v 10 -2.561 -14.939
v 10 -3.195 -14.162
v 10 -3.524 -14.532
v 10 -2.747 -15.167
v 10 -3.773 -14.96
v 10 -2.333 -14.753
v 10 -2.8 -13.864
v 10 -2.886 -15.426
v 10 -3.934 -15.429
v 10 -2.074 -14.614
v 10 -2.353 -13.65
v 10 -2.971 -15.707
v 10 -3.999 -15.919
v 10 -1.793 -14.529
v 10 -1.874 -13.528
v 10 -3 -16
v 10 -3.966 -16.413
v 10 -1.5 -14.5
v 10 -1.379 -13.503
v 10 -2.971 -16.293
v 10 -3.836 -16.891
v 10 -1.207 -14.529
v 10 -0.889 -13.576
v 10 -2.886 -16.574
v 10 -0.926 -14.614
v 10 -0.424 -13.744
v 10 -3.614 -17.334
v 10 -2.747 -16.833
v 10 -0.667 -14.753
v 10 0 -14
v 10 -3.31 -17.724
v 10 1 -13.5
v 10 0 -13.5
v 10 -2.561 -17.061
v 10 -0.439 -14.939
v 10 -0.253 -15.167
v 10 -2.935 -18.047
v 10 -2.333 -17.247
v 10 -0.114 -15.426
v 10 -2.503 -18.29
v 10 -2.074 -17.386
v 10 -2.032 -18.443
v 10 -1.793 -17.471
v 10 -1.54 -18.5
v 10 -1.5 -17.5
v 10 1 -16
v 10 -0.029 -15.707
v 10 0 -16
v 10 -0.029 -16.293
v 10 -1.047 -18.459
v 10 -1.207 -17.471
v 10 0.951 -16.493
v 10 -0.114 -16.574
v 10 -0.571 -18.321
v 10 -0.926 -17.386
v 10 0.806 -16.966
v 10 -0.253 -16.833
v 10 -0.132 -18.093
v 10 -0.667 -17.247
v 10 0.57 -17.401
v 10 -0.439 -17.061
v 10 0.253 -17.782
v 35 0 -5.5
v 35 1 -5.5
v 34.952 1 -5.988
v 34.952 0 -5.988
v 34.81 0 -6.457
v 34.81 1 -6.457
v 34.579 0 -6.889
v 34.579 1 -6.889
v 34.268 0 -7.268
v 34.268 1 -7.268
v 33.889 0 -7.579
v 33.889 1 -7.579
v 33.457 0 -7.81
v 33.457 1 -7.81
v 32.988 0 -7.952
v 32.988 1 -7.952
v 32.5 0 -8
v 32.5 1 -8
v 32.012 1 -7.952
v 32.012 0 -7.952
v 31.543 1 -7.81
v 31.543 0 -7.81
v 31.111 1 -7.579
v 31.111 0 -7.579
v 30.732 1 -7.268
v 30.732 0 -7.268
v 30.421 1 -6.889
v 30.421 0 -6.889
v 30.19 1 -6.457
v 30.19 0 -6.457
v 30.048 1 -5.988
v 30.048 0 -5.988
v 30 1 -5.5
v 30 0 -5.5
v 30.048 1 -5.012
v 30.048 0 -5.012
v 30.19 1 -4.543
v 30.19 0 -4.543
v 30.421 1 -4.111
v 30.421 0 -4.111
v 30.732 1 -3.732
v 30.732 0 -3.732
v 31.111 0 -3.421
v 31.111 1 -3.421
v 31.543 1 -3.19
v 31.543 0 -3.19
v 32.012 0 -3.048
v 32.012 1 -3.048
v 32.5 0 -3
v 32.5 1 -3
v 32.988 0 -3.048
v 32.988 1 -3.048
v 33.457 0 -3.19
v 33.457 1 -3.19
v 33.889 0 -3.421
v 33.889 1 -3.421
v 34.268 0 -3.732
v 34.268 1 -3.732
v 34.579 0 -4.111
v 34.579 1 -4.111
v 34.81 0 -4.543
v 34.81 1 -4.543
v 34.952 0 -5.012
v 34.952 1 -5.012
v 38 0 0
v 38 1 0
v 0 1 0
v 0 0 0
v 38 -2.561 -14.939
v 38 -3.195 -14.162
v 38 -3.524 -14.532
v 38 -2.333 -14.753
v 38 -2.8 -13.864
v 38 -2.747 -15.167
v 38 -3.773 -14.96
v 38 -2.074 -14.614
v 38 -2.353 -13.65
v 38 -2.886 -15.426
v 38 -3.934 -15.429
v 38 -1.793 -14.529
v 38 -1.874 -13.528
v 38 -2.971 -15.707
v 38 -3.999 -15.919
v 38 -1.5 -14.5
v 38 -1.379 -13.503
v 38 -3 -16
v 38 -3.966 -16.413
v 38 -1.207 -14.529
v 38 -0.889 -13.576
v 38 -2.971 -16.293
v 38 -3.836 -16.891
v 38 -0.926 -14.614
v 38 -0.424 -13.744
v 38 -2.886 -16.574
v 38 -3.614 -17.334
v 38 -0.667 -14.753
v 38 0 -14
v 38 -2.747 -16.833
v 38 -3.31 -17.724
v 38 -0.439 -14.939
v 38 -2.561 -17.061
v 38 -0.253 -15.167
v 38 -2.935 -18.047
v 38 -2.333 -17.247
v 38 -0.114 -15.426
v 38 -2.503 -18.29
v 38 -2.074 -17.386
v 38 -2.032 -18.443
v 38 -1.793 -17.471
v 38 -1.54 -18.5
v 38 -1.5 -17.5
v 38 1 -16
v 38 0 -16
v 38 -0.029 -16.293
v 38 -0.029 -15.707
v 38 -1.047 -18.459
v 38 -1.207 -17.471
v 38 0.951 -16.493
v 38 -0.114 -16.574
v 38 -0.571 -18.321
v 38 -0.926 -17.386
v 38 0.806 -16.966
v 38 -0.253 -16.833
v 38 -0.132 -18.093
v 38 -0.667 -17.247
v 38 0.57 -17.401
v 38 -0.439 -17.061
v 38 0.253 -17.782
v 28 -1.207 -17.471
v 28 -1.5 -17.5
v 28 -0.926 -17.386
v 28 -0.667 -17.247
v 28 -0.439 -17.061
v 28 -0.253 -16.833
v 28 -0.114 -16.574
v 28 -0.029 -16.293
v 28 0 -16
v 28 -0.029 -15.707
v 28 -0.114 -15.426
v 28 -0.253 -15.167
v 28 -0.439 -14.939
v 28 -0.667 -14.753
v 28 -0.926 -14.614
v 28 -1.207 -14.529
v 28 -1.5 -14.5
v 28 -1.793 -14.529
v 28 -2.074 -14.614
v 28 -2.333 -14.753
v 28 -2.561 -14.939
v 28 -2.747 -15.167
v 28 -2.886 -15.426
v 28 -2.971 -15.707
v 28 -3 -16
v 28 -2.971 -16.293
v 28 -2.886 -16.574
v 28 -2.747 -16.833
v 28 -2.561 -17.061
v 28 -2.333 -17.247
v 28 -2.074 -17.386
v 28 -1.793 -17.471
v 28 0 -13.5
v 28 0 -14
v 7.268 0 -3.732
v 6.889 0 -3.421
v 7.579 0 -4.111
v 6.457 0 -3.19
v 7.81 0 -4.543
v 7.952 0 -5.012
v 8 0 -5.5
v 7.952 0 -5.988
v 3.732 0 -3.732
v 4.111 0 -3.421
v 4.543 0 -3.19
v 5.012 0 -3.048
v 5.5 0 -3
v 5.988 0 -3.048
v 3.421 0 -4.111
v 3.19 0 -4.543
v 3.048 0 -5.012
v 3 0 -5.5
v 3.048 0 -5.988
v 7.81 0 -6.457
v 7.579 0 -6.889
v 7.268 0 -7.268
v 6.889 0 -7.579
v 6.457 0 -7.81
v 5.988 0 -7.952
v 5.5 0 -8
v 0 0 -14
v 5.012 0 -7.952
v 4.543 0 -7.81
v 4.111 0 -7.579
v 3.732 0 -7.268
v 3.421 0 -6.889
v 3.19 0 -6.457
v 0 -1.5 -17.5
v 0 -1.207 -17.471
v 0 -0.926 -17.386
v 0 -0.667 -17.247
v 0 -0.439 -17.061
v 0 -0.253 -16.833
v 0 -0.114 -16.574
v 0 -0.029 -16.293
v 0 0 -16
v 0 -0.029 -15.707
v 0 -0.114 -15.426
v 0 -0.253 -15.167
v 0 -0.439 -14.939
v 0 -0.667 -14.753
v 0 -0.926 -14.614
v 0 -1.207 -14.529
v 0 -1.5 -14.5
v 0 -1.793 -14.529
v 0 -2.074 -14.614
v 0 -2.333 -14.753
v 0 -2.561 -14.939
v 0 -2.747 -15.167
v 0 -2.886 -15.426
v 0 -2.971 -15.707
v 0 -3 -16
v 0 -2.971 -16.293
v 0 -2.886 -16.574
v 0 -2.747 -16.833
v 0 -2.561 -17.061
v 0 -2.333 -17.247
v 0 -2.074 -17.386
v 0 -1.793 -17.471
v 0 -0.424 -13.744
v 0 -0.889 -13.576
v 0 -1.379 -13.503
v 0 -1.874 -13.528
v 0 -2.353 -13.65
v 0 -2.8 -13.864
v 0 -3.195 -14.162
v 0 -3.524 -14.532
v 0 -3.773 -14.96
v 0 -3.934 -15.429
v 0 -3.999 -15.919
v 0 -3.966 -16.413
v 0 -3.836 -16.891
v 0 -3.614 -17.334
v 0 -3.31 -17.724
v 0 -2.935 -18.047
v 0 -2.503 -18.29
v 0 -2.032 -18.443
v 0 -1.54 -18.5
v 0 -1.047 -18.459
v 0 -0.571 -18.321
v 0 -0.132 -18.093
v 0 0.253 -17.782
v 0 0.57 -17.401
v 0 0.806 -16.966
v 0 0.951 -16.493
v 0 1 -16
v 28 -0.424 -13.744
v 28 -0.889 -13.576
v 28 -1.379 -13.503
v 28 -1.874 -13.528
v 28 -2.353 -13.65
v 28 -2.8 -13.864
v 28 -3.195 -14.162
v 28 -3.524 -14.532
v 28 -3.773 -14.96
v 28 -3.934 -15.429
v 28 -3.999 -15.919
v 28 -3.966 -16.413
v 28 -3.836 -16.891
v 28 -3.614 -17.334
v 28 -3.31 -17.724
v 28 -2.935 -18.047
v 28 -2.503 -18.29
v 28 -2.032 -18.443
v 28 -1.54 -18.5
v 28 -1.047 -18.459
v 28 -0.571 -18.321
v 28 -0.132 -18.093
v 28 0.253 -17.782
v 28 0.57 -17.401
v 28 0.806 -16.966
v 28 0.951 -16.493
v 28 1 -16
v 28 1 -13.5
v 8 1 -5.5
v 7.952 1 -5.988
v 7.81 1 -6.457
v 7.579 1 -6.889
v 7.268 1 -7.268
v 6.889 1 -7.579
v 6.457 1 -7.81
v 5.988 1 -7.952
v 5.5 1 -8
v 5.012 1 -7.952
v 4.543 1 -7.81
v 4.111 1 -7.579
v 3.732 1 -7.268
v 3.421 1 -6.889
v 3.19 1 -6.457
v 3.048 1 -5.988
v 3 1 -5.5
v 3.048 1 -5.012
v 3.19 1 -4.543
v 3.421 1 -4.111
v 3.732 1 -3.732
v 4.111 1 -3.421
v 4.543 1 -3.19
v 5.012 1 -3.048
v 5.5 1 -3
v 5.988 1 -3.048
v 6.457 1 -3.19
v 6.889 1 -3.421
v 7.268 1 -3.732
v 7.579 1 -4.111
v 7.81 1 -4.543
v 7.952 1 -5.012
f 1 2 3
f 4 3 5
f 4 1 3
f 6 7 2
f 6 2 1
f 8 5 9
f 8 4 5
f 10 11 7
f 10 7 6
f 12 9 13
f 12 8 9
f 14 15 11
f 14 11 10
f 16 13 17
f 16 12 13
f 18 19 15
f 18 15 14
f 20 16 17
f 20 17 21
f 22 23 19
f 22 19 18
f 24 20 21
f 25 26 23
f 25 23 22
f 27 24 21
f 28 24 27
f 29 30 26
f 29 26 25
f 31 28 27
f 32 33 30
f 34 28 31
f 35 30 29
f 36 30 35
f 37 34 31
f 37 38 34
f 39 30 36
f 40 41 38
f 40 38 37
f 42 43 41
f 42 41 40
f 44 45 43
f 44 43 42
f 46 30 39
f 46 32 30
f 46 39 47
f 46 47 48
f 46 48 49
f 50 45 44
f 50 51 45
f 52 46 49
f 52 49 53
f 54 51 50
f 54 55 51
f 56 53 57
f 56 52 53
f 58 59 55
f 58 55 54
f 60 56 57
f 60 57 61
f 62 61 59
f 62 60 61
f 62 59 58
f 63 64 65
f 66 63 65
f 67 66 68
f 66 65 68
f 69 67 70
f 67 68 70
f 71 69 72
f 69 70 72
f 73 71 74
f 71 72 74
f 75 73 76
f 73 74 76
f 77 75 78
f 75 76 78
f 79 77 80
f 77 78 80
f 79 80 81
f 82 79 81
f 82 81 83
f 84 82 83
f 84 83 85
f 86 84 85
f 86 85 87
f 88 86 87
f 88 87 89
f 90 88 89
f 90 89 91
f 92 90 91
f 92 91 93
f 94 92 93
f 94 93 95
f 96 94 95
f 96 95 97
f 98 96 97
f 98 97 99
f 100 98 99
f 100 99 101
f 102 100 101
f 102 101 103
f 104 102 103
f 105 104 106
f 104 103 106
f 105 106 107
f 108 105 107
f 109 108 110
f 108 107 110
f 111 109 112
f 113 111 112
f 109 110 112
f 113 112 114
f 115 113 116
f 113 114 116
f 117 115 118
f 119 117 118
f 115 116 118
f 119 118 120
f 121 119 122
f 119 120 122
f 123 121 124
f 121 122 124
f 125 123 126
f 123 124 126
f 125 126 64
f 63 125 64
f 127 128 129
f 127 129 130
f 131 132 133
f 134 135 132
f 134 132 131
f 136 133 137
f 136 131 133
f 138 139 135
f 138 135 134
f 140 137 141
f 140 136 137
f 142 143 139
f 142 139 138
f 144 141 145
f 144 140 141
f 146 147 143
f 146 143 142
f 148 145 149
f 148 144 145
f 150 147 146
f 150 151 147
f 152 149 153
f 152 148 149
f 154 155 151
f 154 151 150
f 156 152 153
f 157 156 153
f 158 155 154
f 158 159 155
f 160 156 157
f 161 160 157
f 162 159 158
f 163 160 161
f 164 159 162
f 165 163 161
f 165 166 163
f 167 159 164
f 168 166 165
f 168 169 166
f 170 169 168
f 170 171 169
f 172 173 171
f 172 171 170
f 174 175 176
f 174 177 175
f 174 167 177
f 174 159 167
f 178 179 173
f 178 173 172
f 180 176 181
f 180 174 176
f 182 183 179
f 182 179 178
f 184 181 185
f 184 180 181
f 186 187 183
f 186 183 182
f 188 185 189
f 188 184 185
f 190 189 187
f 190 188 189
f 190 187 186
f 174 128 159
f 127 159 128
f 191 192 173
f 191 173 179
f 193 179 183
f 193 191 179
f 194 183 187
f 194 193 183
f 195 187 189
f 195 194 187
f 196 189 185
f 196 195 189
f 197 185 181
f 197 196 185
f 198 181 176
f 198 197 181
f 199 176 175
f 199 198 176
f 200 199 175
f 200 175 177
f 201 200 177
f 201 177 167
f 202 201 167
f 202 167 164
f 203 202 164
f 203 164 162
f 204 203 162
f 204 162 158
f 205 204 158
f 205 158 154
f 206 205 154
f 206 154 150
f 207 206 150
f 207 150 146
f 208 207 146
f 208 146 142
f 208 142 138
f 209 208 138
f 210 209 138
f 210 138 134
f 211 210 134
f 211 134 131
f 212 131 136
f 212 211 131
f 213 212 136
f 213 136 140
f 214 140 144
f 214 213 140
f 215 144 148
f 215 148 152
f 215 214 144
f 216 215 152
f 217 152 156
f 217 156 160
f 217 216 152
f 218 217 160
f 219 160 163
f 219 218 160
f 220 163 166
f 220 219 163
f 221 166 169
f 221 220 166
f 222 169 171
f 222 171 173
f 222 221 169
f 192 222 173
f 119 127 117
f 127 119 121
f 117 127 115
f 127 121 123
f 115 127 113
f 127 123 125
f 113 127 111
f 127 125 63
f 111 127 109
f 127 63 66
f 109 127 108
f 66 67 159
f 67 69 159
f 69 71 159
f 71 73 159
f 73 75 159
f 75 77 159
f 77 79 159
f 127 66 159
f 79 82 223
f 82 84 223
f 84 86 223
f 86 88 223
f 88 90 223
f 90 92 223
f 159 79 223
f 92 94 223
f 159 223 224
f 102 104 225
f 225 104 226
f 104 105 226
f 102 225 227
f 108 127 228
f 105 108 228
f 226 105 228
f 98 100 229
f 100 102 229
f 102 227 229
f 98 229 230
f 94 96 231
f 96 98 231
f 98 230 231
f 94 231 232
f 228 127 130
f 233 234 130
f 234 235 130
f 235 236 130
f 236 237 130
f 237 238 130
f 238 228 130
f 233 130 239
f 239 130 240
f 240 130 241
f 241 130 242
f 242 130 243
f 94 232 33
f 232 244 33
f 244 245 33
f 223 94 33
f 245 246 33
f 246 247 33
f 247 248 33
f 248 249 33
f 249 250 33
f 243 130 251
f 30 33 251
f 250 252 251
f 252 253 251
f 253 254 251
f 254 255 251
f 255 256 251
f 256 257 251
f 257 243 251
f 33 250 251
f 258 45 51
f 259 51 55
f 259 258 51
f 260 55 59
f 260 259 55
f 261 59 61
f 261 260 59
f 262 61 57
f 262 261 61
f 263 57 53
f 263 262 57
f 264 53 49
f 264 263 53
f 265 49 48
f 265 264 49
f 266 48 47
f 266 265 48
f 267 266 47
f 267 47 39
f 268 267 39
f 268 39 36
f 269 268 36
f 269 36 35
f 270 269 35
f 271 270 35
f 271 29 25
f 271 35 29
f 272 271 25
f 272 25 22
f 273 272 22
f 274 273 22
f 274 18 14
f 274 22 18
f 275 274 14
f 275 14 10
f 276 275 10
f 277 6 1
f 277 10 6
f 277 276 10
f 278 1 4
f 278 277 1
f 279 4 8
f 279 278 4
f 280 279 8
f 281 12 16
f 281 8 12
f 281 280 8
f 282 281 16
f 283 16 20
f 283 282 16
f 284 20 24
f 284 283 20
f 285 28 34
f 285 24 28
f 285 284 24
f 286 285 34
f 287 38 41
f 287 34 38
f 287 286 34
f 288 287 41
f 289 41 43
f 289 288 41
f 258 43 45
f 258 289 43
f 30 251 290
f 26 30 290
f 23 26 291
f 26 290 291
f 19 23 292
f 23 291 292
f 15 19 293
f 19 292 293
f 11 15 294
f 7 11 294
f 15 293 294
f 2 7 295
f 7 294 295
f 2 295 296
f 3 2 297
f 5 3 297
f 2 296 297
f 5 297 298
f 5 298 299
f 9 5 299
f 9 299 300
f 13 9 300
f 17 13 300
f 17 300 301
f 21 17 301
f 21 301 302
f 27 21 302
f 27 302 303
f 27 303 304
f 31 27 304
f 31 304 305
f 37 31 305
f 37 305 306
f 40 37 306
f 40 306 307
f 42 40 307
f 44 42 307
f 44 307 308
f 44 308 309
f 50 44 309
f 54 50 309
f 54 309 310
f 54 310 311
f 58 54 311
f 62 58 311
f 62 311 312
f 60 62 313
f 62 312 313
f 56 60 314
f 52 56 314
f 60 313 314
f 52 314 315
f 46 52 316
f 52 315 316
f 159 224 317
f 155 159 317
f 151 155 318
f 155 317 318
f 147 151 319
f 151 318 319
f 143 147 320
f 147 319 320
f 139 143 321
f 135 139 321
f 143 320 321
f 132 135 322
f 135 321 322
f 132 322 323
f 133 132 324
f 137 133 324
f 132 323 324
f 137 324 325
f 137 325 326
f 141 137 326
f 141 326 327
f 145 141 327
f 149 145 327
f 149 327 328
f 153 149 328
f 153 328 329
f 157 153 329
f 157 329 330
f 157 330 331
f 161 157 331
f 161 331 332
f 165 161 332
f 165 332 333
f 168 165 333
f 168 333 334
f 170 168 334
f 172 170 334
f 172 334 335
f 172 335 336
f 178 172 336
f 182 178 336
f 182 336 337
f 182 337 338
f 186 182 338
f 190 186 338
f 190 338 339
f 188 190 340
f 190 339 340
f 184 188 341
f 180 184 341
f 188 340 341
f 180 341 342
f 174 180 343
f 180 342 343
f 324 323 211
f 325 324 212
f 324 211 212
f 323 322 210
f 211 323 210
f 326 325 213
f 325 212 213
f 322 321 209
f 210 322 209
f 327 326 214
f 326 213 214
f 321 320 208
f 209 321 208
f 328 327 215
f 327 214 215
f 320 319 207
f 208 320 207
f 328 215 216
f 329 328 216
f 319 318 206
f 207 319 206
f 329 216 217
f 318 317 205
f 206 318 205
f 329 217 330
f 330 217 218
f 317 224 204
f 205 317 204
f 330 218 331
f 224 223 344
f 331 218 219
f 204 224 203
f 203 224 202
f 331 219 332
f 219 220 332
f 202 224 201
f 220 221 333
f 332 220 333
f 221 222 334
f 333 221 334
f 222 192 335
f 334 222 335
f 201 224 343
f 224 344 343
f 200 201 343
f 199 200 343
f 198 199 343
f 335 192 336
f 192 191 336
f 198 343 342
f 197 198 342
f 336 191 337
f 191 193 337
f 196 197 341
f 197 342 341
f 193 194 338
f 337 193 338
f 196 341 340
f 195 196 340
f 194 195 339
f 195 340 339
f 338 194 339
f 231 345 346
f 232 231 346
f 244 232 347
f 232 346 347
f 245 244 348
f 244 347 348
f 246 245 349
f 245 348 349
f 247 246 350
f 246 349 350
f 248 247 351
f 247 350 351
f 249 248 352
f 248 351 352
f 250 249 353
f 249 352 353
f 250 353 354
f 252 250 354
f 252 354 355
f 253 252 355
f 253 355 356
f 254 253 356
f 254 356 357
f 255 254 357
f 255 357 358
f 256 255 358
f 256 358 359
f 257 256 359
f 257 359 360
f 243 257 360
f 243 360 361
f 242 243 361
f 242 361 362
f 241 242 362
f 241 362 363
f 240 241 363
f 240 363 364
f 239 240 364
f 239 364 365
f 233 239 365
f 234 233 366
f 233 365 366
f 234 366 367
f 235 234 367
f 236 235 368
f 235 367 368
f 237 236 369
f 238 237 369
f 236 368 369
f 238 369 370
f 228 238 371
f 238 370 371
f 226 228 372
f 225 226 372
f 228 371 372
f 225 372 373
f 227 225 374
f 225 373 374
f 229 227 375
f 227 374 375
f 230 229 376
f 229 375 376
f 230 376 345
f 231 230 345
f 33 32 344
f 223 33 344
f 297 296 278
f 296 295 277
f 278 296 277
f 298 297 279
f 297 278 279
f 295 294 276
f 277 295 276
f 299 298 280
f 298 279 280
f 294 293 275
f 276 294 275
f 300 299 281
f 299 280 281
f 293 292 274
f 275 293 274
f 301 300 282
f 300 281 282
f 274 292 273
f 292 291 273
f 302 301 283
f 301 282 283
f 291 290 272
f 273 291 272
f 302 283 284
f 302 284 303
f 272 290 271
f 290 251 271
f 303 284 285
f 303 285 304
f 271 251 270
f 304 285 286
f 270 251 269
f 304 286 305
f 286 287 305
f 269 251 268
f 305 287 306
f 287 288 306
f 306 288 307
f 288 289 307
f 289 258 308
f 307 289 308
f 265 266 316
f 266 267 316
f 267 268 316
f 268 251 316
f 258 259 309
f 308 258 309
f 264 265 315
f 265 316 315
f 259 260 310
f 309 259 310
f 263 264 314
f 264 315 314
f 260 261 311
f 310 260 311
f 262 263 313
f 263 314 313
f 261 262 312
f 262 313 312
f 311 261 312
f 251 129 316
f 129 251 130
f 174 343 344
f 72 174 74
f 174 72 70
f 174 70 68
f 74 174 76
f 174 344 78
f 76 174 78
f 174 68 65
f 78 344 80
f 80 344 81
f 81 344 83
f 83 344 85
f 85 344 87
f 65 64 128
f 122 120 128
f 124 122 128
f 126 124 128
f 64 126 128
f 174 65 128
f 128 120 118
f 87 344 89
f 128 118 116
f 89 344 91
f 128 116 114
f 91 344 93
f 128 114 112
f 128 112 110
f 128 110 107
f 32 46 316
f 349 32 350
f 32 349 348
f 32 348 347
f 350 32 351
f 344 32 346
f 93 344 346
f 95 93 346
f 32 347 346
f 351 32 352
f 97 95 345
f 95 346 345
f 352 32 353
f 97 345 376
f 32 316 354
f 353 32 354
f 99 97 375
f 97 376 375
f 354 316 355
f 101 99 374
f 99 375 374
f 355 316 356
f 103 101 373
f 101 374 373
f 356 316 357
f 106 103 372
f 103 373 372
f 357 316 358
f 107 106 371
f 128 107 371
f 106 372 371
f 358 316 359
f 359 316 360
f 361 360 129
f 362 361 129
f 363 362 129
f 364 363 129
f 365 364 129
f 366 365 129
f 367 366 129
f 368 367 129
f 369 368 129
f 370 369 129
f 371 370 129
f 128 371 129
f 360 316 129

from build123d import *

# Parameters (mm, degrees)
SKETCH3_R           = 1.5
BOSS_EXTRUDE2_DEPTH = 38
SKETCH6_W           = 18
SKETCH6_H           = 5
CUT_EXTRUDE1_DEPTH  = 6
SKETCH7_R           = 2.5
CUT_EXTRUDE2_DEPTH  = 10


with BuildPart() as part:
    # Sketch3 → Boss-Extrude2 (new body)
    with BuildSketch(Plane(origin=(0, 0, 0), x_dir=(0, 0, -1), z_dir=(1, 0, 0))):
        with BuildLine():
            Line((16, 1), (0, 1))
            Line((0, 1), (0, 0))
            Line((0, 0), (14, 0))
            ThreePointArc((14, 0), (17.118033989, -3.736067977), (16, 1))
        make_face()
        with Locations((16, -1.5)):
            Circle(SKETCH3_R, mode=Mode.SUBTRACT)
    extrude(amount=BOSS_EXTRUDE2_DEPTH)

    # Sketch6 → Cut-Extrude1 (cut, through all)
    with BuildSketch(Plane(origin=(0, 1, 0), x_dir=(1, 0, 0), z_dir=(0, 1, 0))):
        with Locations((19, 16)):
            Rectangle(SKETCH6_W, SKETCH6_H)
    extrude(amount=-CUT_EXTRUDE1_DEPTH, mode=Mode.SUBTRACT)

    # Sketch7 → Cut-Extrude2 (cut)
    with BuildSketch(Plane(origin=(0, 1, 0), x_dir=(1, 0, 0), z_dir=(0, 1, 0))):
        with Locations((5.5, 5.5)):
            Circle(SKETCH7_R)
        with Locations((32.5, 5.5)):
            Circle(SKETCH7_R)
    extrude(amount=-CUT_EXTRUDE2_DEPTH, mode=Mode.SUBTRACT)


solid = part.part
